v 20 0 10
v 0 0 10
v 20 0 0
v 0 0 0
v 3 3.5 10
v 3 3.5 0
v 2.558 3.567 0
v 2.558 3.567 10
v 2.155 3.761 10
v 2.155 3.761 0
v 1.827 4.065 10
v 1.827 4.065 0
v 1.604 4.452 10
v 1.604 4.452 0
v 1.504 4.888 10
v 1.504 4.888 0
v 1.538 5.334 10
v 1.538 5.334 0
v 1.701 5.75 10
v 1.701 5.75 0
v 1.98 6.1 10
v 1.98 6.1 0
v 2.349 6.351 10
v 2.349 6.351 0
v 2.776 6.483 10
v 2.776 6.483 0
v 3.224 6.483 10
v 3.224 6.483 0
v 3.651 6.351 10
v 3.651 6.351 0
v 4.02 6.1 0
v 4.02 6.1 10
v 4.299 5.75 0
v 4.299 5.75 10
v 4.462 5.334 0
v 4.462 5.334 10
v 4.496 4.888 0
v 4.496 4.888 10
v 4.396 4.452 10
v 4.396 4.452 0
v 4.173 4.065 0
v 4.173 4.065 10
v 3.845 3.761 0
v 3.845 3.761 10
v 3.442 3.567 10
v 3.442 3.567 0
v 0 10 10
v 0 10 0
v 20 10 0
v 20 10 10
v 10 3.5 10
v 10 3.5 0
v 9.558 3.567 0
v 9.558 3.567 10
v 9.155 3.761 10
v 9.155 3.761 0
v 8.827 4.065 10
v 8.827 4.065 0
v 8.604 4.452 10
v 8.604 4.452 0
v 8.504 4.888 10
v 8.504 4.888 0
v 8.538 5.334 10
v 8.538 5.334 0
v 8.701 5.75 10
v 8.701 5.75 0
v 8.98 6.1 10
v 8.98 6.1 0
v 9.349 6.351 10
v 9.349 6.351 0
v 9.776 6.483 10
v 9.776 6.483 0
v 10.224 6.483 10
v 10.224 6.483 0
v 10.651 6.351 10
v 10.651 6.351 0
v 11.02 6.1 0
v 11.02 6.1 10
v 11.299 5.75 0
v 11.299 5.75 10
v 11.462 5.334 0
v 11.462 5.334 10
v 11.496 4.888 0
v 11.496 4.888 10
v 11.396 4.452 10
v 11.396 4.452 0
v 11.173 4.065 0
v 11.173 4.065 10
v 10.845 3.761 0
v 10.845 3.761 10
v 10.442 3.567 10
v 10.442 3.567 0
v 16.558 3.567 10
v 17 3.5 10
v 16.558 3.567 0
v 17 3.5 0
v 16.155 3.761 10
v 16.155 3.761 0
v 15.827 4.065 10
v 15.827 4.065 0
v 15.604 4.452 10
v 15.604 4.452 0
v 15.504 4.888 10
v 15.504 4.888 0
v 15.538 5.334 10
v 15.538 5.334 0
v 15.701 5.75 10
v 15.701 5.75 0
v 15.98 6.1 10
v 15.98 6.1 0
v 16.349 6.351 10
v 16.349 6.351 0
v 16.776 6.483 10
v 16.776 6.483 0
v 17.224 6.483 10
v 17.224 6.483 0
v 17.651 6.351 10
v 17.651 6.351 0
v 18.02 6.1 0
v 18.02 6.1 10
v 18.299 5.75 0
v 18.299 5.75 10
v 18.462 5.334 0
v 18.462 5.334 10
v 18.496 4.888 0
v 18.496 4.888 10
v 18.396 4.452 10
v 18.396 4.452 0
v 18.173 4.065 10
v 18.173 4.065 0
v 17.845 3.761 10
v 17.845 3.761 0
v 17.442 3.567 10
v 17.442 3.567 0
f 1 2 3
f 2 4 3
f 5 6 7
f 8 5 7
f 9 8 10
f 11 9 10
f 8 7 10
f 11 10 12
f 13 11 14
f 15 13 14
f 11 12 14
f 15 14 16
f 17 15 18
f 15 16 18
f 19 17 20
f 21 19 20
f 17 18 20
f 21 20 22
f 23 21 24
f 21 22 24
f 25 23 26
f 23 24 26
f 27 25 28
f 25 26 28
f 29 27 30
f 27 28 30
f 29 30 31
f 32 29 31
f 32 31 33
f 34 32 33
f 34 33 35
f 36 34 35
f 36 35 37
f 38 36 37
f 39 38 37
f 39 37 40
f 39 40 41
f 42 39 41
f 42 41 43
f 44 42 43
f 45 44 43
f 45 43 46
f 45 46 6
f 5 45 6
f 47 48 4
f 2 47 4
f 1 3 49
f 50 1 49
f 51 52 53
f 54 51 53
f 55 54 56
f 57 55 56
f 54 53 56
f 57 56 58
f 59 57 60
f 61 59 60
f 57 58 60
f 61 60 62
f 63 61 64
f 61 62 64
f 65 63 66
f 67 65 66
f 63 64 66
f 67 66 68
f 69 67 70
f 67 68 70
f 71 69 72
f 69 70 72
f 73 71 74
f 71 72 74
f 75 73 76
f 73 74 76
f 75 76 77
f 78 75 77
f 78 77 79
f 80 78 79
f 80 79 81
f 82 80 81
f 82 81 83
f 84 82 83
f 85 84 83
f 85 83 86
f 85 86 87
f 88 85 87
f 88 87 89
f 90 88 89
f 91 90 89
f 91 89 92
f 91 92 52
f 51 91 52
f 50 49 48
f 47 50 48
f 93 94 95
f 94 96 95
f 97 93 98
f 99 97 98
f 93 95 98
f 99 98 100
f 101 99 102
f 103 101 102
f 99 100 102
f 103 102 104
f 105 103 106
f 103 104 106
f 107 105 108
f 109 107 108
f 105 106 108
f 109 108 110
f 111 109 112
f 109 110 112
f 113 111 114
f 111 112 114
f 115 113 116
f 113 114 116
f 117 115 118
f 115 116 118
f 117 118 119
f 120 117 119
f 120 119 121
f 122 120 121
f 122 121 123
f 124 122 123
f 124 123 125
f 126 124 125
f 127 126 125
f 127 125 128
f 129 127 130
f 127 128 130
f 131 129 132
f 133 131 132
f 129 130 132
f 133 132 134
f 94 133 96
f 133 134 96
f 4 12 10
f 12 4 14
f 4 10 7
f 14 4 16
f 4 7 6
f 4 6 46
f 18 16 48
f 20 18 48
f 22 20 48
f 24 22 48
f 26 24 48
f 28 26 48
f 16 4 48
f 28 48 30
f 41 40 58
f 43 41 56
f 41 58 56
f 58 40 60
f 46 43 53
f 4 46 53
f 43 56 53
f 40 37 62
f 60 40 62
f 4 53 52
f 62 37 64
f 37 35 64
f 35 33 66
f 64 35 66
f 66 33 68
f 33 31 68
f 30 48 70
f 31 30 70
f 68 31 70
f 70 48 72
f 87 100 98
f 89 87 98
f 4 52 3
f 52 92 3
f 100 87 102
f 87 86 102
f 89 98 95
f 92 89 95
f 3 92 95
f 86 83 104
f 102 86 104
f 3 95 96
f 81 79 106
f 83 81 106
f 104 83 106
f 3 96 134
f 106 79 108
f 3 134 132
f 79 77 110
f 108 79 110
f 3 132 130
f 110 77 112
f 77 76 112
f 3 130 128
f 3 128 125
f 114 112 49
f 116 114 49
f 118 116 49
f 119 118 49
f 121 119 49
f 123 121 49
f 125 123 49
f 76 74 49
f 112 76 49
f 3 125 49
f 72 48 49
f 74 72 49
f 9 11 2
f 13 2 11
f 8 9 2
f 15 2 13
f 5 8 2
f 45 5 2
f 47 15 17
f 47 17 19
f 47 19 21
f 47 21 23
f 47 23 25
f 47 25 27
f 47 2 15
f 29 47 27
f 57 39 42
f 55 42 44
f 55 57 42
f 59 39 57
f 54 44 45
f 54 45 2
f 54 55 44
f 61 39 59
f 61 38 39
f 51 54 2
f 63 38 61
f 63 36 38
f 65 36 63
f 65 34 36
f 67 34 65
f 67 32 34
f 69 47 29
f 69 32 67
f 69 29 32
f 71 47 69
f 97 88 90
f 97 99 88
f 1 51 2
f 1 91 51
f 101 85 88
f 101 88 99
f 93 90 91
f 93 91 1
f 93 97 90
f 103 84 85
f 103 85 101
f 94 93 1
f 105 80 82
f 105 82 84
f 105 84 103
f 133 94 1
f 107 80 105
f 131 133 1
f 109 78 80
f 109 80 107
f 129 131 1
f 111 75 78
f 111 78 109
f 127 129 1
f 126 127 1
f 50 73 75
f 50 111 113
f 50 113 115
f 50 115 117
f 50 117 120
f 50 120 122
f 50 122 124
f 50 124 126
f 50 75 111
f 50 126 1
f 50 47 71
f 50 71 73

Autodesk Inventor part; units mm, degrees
ref_plane "YZ Plane" through (0, 0, 0) normal (1, 0, 0) x (0, 1, 0)
ref_plane "XZ Plane" through (0, 0, 0) normal (0, 1, 0) x (-1, 0, 0)
ref_plane "XY Plane" through (0, 0, 0) normal (0, 0, 1) x (1, 0, 0)
sketch "スケッチ1" plane through (0, 0, 0) normal (0, 0, 1) x (1, 0, 0)
  line L0 (0, 0) -> (20, 0)
  line L1 (20, 0) -> (20, 10)
  line L2 (20, 10) -> (0, 10)
  line L3 (0, 10) -> (0, 0)
  dimension "d0" = 20
  dimension "d1" = 10
extrude "押し出し1" add sketch "スケッチ1" along normal blind 10
sketch "スケッチ3" plane through (0, 0, 10) normal (0, 0, 1) x (1, 0, 0)
  line L0 (20, 10) -> (0, 10) projected
  point P0 (0, 0)
  point P1 (10, 5)
  dimension "d13" = 5
hole "穴2" at (10, 5, 10) direction (0, 0, -1) diameter 3 end through all
sketch "スケッチ4" plane through (0, 0, 10) normal (0, 0, 1) x (1, 0, 0)
  line L0 (0, 10) -> (0, 0) projected
  line L1 (20, 0) -> (20, 10) projected
  point P0 (3, 5)
  point P1 (17, 5)
  dimension "d21" = 3
  dimension "d22" = 3
hole "穴3" at (3, 5, 10) at (17, 5, 10) direction (0, 0, -1) diameter 3 end through all
properties part number "指下"
